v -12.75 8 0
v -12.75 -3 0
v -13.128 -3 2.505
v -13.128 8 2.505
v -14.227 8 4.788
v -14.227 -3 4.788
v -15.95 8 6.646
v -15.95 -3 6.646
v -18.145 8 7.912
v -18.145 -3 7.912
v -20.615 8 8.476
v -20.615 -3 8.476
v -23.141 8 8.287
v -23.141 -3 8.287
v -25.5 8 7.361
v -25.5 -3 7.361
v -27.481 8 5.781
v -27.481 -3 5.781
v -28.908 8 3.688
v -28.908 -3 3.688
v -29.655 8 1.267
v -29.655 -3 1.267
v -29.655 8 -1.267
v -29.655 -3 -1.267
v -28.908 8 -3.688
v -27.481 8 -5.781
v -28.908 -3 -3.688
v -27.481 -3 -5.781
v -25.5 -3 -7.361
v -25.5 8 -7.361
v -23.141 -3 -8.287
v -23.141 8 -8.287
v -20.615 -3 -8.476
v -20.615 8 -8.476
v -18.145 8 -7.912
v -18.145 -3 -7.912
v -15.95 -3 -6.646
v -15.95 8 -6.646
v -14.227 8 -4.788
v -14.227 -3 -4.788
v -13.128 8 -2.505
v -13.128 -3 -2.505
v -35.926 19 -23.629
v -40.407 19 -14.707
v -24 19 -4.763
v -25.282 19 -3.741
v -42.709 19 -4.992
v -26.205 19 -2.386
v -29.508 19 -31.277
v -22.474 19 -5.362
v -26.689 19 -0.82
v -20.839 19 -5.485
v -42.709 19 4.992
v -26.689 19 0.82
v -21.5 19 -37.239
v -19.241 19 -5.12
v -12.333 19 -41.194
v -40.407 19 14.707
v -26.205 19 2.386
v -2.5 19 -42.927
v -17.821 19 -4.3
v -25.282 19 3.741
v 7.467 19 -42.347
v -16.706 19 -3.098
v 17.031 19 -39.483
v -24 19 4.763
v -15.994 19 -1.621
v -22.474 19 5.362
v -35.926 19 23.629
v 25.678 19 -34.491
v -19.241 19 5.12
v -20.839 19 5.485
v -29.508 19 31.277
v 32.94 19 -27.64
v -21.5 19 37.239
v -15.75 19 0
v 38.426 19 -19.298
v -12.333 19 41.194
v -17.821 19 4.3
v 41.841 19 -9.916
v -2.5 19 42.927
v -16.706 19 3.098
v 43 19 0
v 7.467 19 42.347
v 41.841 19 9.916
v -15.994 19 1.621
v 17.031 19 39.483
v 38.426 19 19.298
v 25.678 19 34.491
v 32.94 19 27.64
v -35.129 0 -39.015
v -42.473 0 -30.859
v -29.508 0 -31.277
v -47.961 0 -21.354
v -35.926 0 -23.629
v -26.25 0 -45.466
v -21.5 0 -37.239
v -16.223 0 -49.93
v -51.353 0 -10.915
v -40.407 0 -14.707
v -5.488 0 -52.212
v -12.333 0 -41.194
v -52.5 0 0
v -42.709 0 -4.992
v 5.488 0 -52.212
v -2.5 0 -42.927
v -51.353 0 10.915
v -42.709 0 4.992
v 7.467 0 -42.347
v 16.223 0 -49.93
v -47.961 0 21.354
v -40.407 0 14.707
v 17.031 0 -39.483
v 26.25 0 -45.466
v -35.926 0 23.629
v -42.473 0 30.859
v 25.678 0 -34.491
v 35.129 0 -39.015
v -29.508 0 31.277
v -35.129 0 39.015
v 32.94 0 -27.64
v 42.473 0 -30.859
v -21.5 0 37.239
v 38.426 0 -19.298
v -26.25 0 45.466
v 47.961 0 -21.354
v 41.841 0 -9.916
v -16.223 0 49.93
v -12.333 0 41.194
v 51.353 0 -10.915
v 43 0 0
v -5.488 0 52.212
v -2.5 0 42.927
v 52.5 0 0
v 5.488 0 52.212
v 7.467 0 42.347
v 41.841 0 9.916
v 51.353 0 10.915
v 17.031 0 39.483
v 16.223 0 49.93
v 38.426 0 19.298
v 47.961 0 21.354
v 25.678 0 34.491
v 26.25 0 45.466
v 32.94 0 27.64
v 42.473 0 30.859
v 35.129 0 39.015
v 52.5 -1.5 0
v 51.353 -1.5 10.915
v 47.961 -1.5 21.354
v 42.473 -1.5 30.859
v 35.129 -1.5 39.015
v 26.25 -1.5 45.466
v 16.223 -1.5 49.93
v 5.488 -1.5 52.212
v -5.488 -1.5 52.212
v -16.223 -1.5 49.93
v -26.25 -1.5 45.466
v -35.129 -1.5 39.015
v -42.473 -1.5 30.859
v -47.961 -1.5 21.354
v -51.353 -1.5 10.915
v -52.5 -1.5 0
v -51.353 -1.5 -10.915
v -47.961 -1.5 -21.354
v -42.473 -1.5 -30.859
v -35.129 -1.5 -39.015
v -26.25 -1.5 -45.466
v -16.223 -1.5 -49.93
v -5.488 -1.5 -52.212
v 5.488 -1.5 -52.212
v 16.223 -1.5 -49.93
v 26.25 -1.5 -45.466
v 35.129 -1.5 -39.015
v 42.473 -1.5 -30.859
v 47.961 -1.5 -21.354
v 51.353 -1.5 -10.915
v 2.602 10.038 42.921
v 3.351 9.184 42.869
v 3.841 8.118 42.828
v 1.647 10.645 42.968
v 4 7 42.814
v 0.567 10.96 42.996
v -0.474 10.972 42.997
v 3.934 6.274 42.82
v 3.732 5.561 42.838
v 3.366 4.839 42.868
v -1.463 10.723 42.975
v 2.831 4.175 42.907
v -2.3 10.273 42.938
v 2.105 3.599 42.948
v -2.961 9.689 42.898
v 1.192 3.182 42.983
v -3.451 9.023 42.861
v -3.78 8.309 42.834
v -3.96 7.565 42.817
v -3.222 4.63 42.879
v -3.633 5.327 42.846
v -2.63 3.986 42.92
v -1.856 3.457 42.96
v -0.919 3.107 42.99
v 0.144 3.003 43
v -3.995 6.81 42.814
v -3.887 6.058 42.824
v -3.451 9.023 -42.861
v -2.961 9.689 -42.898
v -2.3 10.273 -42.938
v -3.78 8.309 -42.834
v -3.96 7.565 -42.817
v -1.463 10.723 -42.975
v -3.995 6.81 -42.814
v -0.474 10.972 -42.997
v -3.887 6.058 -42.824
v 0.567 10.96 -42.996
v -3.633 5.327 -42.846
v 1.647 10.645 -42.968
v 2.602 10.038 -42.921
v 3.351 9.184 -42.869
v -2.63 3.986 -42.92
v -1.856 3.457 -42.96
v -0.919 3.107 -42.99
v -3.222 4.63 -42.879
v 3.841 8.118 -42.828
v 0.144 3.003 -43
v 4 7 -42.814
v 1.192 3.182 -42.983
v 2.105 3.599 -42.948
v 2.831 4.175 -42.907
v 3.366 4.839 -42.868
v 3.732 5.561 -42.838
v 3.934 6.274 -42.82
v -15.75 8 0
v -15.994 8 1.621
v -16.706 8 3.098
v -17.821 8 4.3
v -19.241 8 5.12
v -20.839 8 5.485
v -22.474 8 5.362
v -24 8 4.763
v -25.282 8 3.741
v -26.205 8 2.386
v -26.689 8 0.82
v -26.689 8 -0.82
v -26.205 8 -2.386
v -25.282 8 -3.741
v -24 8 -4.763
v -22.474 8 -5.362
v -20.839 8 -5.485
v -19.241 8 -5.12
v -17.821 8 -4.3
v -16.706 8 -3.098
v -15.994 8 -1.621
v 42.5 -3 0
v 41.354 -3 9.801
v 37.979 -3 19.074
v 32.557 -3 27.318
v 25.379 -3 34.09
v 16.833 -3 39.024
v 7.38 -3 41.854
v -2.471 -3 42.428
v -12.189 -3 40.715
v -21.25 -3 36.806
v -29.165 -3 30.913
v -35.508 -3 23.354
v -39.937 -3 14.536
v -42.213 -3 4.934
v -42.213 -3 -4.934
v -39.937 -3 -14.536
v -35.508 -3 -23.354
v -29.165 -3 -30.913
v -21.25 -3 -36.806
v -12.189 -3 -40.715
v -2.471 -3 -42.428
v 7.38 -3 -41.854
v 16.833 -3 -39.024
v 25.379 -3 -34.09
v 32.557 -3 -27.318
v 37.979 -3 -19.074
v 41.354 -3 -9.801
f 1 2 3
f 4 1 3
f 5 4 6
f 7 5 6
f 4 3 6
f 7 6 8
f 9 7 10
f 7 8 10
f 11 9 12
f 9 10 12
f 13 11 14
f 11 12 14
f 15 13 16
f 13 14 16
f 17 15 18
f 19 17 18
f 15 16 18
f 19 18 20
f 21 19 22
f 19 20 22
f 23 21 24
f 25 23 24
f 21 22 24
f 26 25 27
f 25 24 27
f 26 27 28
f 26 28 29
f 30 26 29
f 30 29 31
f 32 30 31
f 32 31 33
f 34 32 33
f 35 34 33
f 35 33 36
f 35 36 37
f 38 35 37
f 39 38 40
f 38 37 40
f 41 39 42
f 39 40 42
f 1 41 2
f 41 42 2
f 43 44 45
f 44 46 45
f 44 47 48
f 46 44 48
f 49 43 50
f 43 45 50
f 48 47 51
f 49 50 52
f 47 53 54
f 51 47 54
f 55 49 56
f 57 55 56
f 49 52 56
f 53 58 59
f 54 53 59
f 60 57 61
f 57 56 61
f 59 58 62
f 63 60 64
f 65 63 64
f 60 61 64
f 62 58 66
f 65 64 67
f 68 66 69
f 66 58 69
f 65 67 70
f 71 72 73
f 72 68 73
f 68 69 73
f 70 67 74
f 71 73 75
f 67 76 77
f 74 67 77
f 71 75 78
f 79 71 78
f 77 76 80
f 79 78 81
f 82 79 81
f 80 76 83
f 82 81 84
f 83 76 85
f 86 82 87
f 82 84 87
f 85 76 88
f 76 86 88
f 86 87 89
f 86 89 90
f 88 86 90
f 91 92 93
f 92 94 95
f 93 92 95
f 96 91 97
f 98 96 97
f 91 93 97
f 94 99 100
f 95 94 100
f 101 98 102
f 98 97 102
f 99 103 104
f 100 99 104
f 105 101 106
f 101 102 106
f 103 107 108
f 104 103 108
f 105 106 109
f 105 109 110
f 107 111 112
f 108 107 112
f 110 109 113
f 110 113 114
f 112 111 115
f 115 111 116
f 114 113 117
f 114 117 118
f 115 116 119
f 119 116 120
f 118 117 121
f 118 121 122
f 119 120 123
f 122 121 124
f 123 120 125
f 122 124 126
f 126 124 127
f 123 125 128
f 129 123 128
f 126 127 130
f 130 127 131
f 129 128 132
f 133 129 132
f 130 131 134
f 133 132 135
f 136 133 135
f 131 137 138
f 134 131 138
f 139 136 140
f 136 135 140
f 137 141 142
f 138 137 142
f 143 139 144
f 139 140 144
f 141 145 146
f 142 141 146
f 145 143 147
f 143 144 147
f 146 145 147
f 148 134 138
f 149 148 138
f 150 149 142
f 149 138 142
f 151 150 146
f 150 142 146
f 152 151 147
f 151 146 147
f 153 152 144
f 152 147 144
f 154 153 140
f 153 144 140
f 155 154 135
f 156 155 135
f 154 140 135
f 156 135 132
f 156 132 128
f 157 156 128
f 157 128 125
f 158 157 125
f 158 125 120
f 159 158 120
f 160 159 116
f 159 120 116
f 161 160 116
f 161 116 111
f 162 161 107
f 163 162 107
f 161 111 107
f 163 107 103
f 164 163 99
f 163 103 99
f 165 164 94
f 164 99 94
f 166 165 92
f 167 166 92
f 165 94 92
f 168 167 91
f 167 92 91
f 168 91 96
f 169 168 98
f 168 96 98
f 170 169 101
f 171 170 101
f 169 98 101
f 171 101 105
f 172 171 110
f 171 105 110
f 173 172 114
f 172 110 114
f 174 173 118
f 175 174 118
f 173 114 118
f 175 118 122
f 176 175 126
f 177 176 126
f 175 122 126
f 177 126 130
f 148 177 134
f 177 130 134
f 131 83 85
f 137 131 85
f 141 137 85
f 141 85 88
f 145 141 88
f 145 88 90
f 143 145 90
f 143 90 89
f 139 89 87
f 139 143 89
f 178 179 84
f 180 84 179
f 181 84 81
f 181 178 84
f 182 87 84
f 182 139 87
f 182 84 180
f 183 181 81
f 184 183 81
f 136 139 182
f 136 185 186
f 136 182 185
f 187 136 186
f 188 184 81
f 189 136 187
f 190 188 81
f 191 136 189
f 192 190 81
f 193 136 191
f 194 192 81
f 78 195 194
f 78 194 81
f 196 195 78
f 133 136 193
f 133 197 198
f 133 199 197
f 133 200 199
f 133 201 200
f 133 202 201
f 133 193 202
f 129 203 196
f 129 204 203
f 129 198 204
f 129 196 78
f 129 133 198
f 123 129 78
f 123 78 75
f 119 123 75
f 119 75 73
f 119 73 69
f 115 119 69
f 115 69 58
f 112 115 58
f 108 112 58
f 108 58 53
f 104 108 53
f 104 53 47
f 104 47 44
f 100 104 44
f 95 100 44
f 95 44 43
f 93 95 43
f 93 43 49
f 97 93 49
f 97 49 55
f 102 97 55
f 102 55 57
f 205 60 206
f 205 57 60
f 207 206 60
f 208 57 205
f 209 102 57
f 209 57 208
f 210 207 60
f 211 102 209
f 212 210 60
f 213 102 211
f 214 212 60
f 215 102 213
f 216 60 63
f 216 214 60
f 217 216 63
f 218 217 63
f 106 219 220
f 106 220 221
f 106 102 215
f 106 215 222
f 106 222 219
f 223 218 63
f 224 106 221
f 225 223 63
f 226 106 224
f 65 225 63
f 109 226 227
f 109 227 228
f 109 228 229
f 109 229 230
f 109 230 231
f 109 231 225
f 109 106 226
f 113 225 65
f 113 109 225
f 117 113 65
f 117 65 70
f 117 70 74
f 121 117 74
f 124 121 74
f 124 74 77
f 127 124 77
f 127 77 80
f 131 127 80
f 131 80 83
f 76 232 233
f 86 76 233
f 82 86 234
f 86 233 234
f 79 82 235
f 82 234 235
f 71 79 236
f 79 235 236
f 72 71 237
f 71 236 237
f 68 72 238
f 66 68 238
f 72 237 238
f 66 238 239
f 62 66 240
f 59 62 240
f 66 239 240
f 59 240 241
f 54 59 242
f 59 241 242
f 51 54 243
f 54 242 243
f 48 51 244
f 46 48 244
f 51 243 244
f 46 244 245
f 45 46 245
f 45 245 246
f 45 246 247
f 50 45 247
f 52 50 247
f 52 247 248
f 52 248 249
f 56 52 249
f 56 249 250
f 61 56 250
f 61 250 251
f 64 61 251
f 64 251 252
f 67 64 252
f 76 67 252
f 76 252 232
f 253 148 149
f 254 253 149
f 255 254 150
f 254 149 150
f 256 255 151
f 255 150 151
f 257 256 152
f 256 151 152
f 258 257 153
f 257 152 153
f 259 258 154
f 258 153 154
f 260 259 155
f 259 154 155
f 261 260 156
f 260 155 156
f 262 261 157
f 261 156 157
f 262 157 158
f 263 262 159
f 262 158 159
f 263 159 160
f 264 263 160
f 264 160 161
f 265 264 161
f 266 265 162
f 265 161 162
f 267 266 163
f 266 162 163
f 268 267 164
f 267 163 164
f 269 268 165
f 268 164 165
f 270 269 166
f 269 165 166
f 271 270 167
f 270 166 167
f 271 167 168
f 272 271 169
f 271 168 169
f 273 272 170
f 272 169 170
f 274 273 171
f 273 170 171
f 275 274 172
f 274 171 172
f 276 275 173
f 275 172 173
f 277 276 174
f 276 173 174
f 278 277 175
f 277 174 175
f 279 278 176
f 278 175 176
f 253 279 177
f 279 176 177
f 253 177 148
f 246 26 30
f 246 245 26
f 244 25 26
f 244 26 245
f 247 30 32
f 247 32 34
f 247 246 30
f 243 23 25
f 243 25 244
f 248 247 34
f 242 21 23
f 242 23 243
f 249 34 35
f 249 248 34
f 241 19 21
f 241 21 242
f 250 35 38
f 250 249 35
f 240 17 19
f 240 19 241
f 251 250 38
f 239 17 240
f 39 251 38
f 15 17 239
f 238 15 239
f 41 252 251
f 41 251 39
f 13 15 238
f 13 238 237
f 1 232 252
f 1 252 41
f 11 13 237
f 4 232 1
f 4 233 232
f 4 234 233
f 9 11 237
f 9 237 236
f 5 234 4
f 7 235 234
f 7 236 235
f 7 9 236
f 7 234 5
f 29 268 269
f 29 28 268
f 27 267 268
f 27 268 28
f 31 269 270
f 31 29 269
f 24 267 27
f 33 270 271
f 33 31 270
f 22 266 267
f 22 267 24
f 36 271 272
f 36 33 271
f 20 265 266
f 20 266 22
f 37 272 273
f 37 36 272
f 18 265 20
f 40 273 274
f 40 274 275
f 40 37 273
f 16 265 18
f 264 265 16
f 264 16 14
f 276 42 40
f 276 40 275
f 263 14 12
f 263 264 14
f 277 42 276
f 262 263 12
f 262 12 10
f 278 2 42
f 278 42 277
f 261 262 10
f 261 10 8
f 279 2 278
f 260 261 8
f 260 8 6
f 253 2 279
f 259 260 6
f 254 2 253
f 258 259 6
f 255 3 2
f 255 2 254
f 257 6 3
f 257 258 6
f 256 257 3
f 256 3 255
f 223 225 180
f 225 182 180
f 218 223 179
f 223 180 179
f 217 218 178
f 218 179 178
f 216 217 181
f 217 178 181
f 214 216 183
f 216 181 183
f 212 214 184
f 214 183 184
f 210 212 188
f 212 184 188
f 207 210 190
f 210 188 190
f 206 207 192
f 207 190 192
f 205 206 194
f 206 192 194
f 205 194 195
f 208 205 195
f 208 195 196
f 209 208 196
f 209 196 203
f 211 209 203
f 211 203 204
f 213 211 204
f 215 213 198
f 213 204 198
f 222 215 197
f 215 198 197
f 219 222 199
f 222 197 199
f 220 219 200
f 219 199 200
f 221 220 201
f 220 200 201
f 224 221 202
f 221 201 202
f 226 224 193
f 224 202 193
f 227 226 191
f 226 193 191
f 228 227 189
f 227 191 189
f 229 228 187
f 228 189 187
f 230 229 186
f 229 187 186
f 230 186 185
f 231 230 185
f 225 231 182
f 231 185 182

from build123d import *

# Parameters (mm, degrees)
F0_R      = 52.5
F1_DEPTH  = 3
F2_R      = 43
F3_DEPTH  = 22
F4_R      = 8.5
F5_DEPTH  = 11
F6_R      = 5.5
F7_DEPTH  = 11.001
F8_SIZE2  = 1.5
F8_SIZE   = 10
F9_R      = 4
F10_DEPTH = 50


with BuildPart() as f1:
    # F0 (on Front) → F1 (new body)
    with BuildSketch(Plane.XZ):
        Circle(F0_R)
    extrude(amount=F1_DEPTH)

    # F2 (on face) → F3 (join)
    with BuildSketch(Plane.XZ.offset(3)):
        Circle(F2_R)
    extrude(amount=-F3_DEPTH)

    # F4 (on face) → F5 (cut)
    with BuildSketch(Plane.XZ.offset(3)):
        with Locations((-21.25, 0)):
            Circle(F4_R)
    extrude(amount=-F5_DEPTH, mode=Mode.SUBTRACT)

    # F6 (on face) → F7 (cut, through all)
    with BuildSketch(Plane.XZ.offset(-8)):
        with Locations((-21.25, 0)):
            Circle(F6_R)
    extrude(amount=-F7_DEPTH, mode=Mode.SUBTRACT)

    # F8
    f8_edges = [f1.edges().sort_by_distance(p)[0] for p in [
        (-52.5, -3, 0),
    ]]
    f8_side = f1.faces().sort_by_distance((0.572024, -3, 0))[0]
    chamfer(f8_edges, length=F8_SIZE, length2=F8_SIZE2, reference=f8_side)

    # F9 (on Top) → F10 (cut, symmetric)
    with BuildSketch(Plane.XY):
        with Locations((0, 7)):
            Circle(F9_R)
    extrude(amount=F10_DEPTH, both=True, mode=Mode.SUBTRACT)


solid = f1.part
